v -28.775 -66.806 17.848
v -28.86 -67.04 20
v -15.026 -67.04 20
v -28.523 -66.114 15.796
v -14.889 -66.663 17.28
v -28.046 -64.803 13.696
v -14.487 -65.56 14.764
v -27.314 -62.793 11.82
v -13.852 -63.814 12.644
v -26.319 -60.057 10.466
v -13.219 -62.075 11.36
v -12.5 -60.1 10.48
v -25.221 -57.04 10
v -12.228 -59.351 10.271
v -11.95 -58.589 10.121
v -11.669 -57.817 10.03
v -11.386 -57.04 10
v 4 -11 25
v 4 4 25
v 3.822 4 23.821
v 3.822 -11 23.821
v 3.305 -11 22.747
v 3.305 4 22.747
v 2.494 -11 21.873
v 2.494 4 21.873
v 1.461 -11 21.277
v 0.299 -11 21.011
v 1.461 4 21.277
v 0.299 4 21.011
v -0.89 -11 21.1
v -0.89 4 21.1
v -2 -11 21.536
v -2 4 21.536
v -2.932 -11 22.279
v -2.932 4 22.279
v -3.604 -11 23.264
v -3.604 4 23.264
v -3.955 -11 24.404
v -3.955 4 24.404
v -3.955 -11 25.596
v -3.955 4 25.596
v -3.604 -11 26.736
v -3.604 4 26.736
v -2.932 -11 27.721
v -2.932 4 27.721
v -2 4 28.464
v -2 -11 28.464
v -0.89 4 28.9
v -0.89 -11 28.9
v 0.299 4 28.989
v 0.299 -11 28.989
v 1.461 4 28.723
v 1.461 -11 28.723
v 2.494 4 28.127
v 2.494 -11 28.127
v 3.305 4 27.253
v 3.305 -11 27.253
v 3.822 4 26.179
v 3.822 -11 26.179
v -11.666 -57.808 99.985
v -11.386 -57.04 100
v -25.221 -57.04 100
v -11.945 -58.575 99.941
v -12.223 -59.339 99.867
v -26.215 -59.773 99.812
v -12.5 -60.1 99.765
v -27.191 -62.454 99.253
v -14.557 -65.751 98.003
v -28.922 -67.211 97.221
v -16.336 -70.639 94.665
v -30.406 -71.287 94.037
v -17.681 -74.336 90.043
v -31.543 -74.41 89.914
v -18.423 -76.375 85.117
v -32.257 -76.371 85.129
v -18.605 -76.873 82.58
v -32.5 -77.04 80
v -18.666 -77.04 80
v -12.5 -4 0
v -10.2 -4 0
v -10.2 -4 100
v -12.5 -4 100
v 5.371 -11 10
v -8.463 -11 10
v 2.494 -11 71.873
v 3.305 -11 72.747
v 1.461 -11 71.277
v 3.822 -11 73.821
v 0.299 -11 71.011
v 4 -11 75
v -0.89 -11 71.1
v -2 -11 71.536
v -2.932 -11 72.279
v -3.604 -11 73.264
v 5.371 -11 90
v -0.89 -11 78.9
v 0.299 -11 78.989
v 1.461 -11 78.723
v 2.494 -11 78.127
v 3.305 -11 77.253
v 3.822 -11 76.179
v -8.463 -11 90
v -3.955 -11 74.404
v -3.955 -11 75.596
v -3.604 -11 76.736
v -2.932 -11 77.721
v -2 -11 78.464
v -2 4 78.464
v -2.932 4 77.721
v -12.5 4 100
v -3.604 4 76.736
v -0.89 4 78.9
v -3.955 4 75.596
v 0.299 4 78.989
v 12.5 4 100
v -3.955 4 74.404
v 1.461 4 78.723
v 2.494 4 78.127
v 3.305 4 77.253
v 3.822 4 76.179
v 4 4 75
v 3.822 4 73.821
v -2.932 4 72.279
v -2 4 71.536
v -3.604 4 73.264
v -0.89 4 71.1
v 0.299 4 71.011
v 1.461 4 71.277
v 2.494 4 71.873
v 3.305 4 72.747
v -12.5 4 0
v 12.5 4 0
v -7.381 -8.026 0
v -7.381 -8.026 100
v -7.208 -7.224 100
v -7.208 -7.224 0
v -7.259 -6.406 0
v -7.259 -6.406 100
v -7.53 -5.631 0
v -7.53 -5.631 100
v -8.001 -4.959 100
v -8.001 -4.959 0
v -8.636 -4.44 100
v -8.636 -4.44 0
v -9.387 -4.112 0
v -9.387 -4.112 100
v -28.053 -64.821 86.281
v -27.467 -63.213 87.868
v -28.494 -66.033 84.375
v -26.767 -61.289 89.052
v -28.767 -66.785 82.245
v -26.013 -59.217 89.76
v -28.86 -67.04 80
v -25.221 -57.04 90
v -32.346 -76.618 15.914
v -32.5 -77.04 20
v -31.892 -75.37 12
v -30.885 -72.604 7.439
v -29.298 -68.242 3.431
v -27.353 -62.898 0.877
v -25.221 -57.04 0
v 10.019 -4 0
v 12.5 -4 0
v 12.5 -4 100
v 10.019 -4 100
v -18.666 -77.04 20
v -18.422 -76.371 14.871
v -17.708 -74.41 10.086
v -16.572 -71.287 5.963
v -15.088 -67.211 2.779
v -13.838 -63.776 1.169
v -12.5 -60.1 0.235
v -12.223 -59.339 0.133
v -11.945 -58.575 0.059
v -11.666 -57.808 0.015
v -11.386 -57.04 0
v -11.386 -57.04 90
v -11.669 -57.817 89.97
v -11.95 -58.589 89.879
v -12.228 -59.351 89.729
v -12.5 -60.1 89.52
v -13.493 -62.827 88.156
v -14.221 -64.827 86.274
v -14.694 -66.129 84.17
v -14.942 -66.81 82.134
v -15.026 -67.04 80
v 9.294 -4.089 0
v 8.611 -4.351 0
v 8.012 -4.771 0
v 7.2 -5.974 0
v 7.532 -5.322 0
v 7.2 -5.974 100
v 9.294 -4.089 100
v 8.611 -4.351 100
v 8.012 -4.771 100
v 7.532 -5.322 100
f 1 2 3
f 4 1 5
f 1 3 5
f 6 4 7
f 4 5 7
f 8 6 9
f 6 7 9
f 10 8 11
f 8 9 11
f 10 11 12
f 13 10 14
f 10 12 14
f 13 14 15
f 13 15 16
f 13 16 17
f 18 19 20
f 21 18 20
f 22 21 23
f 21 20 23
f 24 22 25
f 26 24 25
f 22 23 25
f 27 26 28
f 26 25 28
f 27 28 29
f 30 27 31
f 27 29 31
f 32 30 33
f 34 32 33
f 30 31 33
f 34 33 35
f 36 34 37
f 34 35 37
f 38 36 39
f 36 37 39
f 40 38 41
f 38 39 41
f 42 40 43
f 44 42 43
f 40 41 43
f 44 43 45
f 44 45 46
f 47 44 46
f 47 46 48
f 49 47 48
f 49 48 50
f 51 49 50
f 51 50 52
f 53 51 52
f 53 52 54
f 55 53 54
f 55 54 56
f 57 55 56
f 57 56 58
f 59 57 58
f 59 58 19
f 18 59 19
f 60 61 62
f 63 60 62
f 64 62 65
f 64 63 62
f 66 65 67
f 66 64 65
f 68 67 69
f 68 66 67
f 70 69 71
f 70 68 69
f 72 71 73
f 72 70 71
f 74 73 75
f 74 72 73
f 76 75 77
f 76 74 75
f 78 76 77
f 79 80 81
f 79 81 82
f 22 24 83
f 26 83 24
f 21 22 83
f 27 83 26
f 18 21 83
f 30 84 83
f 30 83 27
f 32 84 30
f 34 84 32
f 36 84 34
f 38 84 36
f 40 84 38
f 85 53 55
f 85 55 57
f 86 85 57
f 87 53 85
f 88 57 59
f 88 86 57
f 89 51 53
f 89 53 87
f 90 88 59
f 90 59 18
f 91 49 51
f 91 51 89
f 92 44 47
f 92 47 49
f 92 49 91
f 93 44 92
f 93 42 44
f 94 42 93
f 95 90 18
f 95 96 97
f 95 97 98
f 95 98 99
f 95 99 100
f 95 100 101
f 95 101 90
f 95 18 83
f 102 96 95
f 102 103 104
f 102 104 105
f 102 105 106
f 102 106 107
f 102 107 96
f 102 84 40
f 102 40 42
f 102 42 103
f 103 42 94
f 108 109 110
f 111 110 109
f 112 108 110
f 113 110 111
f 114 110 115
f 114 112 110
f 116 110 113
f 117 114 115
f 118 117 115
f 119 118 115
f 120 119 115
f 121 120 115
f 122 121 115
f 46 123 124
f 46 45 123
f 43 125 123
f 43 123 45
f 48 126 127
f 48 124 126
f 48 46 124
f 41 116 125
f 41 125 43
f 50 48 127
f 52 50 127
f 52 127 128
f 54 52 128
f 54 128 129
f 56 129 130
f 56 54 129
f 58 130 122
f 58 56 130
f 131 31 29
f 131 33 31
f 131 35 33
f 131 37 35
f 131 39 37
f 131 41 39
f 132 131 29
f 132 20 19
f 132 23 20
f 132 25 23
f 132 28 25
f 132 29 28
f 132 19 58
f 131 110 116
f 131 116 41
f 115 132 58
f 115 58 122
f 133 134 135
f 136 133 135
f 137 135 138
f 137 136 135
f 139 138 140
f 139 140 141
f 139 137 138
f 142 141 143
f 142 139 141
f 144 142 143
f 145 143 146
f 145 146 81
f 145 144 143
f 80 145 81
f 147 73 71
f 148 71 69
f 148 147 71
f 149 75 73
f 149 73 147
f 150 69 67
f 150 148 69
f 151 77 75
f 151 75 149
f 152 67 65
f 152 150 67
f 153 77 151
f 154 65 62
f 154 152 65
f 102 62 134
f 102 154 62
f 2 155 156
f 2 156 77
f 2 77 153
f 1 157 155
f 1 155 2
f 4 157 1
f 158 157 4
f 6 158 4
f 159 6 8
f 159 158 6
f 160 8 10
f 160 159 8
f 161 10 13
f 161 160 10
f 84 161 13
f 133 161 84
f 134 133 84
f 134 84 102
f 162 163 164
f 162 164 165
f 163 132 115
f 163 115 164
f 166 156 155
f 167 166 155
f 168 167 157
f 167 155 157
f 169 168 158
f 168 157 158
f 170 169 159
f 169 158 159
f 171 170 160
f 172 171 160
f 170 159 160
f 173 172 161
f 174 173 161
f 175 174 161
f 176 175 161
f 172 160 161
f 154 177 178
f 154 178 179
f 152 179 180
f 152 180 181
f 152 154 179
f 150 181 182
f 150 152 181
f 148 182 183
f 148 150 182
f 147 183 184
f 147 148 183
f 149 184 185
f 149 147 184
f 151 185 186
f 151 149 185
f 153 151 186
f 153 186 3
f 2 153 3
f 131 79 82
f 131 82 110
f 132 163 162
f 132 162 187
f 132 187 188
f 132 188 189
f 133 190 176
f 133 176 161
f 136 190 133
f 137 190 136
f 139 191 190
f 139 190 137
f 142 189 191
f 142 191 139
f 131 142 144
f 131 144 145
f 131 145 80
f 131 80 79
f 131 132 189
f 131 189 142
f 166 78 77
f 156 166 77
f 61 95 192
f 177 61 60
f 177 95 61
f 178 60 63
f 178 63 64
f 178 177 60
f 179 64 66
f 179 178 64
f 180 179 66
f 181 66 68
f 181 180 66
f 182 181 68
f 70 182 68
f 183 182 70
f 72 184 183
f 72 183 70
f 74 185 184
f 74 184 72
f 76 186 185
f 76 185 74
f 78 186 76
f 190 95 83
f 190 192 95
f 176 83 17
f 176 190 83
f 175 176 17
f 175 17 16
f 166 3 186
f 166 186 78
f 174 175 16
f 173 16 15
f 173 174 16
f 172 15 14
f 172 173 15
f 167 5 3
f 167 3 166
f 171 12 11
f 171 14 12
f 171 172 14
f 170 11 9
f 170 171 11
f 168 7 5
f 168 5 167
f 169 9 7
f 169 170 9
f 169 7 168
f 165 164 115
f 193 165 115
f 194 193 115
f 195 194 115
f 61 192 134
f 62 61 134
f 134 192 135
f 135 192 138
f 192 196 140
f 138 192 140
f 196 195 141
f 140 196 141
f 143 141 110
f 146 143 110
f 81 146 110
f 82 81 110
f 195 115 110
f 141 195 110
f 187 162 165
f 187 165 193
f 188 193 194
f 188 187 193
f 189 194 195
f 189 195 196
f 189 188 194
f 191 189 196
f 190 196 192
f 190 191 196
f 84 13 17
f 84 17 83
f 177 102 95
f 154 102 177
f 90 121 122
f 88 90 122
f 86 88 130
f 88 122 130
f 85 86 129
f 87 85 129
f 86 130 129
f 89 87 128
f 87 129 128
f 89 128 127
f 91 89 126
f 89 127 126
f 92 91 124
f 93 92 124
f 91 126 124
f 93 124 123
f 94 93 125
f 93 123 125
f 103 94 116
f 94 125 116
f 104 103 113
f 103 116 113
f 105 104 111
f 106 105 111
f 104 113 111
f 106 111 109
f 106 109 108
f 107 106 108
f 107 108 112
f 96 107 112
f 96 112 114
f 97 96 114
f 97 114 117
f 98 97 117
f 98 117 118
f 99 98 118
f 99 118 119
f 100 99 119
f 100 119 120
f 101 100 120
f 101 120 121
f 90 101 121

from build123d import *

# Parameters (mm, degrees)
BOSS_EXTRUDE1_DEPTH     = 100
CUT_EXTRUDE1_DEPTH      = 21
CUT_EXTRUDE1_DEPTH_BACK = 26
SKETCH5_R               = 4
CUT_EXTRUDE2_DEPTH      = 1
CUT_EXTRUDE2_DEPTH_BACK = 82.040159654


with BuildPart() as part:
    # Sketch1 → Boss-Extrude1 (new body)
    with BuildSketch(Plane.XY):
        with BuildLine():
            Line((7.200299815, -5.97393957), (-18.665688958, -77.040159654))
            Line((-18.665688958, -77.040159654), (-32.5, -77.040159654))
            Line((-32.5, -77.040159654), (-7.380922138, -8.02606043))
            ThreePointArc((-7.380922138, -8.02606043), (-7.742543867, -5.279270691), (-10.2, -4))
            Line((-10.2, -4), (-12.5, -4))
            Line((-12.5, -4), (-12.5, 4))
            Line((-12.5, 4), (12.5, 4))
            Line((12.5, 4), (12.5, -4))
            Line((12.5, -4), (10.019377677, -4))
            ThreePointArc((10.019377677, -4), (8.298648368, -4.542543867), (7.200299815, -5.97393957))
        make_face()
    extrude(amount=BOSS_EXTRUDE1_DEPTH)

    # Sketch4 → Cut-Extrude1 (cut, two sides)
    with BuildSketch(Plane.ZY.offset(12.5)) as cut_extrude1_sk:
        with BuildLine():
            ThreePointArc((20, -67.040159654), (12.928932188, -64.111227466), (10, -57.040159654))
            Line((10, -57.040159654), (10, -11))
            Line((10, -11), (90, -11))
            Line((90, -11), (90, -57.040159654))
            ThreePointArc((90, -57.040159654), (87.071067812, -64.111227466), (80, -67.040159654))
            Line((80, -67.040159654), (20, -67.040159654))
        make_face()
        with BuildLine():
            ThreePointArc((100, -57.040159654), (94.142135624, -71.182295278), (80, -77.040159654))
            Line((80, -77.040159654), (100, -77.040159654))
            Line((100, -77.040159654), (100, -57.040159654))
        make_face()
        with BuildLine():
            ThreePointArc((20, -77.040159654), (5.857864376, -71.182295278), (0, -57.040159654))
            Line((0, -57.040159654), (0, -77.040159654))
            Line((0, -77.040159654), (20, -77.040159654))
        make_face()
    extrude(amount=CUT_EXTRUDE1_DEPTH, mode=Mode.SUBTRACT)
    extrude(cut_extrude1_sk.sketch, amount=-CUT_EXTRUDE1_DEPTH_BACK, mode=Mode.SUBTRACT)

    # Sketch5 → Cut-Extrude2 (cut, two sides)
    with BuildSketch(Plane(origin=(0, 4, 0), x_dir=(1, 0, 0), z_dir=(0, 1, 0))) as cut_extrude2_sk:
        with Locations((0, -25)):
            Circle(SKETCH5_R)
        with Locations((0, -75)):
            Circle(SKETCH5_R)
    extrude(amount=CUT_EXTRUDE2_DEPTH, mode=Mode.SUBTRACT)
    extrude(cut_extrude2_sk.sketch, amount=-CUT_EXTRUDE2_DEPTH_BACK, mode=Mode.SUBTRACT)


solid = part.part
